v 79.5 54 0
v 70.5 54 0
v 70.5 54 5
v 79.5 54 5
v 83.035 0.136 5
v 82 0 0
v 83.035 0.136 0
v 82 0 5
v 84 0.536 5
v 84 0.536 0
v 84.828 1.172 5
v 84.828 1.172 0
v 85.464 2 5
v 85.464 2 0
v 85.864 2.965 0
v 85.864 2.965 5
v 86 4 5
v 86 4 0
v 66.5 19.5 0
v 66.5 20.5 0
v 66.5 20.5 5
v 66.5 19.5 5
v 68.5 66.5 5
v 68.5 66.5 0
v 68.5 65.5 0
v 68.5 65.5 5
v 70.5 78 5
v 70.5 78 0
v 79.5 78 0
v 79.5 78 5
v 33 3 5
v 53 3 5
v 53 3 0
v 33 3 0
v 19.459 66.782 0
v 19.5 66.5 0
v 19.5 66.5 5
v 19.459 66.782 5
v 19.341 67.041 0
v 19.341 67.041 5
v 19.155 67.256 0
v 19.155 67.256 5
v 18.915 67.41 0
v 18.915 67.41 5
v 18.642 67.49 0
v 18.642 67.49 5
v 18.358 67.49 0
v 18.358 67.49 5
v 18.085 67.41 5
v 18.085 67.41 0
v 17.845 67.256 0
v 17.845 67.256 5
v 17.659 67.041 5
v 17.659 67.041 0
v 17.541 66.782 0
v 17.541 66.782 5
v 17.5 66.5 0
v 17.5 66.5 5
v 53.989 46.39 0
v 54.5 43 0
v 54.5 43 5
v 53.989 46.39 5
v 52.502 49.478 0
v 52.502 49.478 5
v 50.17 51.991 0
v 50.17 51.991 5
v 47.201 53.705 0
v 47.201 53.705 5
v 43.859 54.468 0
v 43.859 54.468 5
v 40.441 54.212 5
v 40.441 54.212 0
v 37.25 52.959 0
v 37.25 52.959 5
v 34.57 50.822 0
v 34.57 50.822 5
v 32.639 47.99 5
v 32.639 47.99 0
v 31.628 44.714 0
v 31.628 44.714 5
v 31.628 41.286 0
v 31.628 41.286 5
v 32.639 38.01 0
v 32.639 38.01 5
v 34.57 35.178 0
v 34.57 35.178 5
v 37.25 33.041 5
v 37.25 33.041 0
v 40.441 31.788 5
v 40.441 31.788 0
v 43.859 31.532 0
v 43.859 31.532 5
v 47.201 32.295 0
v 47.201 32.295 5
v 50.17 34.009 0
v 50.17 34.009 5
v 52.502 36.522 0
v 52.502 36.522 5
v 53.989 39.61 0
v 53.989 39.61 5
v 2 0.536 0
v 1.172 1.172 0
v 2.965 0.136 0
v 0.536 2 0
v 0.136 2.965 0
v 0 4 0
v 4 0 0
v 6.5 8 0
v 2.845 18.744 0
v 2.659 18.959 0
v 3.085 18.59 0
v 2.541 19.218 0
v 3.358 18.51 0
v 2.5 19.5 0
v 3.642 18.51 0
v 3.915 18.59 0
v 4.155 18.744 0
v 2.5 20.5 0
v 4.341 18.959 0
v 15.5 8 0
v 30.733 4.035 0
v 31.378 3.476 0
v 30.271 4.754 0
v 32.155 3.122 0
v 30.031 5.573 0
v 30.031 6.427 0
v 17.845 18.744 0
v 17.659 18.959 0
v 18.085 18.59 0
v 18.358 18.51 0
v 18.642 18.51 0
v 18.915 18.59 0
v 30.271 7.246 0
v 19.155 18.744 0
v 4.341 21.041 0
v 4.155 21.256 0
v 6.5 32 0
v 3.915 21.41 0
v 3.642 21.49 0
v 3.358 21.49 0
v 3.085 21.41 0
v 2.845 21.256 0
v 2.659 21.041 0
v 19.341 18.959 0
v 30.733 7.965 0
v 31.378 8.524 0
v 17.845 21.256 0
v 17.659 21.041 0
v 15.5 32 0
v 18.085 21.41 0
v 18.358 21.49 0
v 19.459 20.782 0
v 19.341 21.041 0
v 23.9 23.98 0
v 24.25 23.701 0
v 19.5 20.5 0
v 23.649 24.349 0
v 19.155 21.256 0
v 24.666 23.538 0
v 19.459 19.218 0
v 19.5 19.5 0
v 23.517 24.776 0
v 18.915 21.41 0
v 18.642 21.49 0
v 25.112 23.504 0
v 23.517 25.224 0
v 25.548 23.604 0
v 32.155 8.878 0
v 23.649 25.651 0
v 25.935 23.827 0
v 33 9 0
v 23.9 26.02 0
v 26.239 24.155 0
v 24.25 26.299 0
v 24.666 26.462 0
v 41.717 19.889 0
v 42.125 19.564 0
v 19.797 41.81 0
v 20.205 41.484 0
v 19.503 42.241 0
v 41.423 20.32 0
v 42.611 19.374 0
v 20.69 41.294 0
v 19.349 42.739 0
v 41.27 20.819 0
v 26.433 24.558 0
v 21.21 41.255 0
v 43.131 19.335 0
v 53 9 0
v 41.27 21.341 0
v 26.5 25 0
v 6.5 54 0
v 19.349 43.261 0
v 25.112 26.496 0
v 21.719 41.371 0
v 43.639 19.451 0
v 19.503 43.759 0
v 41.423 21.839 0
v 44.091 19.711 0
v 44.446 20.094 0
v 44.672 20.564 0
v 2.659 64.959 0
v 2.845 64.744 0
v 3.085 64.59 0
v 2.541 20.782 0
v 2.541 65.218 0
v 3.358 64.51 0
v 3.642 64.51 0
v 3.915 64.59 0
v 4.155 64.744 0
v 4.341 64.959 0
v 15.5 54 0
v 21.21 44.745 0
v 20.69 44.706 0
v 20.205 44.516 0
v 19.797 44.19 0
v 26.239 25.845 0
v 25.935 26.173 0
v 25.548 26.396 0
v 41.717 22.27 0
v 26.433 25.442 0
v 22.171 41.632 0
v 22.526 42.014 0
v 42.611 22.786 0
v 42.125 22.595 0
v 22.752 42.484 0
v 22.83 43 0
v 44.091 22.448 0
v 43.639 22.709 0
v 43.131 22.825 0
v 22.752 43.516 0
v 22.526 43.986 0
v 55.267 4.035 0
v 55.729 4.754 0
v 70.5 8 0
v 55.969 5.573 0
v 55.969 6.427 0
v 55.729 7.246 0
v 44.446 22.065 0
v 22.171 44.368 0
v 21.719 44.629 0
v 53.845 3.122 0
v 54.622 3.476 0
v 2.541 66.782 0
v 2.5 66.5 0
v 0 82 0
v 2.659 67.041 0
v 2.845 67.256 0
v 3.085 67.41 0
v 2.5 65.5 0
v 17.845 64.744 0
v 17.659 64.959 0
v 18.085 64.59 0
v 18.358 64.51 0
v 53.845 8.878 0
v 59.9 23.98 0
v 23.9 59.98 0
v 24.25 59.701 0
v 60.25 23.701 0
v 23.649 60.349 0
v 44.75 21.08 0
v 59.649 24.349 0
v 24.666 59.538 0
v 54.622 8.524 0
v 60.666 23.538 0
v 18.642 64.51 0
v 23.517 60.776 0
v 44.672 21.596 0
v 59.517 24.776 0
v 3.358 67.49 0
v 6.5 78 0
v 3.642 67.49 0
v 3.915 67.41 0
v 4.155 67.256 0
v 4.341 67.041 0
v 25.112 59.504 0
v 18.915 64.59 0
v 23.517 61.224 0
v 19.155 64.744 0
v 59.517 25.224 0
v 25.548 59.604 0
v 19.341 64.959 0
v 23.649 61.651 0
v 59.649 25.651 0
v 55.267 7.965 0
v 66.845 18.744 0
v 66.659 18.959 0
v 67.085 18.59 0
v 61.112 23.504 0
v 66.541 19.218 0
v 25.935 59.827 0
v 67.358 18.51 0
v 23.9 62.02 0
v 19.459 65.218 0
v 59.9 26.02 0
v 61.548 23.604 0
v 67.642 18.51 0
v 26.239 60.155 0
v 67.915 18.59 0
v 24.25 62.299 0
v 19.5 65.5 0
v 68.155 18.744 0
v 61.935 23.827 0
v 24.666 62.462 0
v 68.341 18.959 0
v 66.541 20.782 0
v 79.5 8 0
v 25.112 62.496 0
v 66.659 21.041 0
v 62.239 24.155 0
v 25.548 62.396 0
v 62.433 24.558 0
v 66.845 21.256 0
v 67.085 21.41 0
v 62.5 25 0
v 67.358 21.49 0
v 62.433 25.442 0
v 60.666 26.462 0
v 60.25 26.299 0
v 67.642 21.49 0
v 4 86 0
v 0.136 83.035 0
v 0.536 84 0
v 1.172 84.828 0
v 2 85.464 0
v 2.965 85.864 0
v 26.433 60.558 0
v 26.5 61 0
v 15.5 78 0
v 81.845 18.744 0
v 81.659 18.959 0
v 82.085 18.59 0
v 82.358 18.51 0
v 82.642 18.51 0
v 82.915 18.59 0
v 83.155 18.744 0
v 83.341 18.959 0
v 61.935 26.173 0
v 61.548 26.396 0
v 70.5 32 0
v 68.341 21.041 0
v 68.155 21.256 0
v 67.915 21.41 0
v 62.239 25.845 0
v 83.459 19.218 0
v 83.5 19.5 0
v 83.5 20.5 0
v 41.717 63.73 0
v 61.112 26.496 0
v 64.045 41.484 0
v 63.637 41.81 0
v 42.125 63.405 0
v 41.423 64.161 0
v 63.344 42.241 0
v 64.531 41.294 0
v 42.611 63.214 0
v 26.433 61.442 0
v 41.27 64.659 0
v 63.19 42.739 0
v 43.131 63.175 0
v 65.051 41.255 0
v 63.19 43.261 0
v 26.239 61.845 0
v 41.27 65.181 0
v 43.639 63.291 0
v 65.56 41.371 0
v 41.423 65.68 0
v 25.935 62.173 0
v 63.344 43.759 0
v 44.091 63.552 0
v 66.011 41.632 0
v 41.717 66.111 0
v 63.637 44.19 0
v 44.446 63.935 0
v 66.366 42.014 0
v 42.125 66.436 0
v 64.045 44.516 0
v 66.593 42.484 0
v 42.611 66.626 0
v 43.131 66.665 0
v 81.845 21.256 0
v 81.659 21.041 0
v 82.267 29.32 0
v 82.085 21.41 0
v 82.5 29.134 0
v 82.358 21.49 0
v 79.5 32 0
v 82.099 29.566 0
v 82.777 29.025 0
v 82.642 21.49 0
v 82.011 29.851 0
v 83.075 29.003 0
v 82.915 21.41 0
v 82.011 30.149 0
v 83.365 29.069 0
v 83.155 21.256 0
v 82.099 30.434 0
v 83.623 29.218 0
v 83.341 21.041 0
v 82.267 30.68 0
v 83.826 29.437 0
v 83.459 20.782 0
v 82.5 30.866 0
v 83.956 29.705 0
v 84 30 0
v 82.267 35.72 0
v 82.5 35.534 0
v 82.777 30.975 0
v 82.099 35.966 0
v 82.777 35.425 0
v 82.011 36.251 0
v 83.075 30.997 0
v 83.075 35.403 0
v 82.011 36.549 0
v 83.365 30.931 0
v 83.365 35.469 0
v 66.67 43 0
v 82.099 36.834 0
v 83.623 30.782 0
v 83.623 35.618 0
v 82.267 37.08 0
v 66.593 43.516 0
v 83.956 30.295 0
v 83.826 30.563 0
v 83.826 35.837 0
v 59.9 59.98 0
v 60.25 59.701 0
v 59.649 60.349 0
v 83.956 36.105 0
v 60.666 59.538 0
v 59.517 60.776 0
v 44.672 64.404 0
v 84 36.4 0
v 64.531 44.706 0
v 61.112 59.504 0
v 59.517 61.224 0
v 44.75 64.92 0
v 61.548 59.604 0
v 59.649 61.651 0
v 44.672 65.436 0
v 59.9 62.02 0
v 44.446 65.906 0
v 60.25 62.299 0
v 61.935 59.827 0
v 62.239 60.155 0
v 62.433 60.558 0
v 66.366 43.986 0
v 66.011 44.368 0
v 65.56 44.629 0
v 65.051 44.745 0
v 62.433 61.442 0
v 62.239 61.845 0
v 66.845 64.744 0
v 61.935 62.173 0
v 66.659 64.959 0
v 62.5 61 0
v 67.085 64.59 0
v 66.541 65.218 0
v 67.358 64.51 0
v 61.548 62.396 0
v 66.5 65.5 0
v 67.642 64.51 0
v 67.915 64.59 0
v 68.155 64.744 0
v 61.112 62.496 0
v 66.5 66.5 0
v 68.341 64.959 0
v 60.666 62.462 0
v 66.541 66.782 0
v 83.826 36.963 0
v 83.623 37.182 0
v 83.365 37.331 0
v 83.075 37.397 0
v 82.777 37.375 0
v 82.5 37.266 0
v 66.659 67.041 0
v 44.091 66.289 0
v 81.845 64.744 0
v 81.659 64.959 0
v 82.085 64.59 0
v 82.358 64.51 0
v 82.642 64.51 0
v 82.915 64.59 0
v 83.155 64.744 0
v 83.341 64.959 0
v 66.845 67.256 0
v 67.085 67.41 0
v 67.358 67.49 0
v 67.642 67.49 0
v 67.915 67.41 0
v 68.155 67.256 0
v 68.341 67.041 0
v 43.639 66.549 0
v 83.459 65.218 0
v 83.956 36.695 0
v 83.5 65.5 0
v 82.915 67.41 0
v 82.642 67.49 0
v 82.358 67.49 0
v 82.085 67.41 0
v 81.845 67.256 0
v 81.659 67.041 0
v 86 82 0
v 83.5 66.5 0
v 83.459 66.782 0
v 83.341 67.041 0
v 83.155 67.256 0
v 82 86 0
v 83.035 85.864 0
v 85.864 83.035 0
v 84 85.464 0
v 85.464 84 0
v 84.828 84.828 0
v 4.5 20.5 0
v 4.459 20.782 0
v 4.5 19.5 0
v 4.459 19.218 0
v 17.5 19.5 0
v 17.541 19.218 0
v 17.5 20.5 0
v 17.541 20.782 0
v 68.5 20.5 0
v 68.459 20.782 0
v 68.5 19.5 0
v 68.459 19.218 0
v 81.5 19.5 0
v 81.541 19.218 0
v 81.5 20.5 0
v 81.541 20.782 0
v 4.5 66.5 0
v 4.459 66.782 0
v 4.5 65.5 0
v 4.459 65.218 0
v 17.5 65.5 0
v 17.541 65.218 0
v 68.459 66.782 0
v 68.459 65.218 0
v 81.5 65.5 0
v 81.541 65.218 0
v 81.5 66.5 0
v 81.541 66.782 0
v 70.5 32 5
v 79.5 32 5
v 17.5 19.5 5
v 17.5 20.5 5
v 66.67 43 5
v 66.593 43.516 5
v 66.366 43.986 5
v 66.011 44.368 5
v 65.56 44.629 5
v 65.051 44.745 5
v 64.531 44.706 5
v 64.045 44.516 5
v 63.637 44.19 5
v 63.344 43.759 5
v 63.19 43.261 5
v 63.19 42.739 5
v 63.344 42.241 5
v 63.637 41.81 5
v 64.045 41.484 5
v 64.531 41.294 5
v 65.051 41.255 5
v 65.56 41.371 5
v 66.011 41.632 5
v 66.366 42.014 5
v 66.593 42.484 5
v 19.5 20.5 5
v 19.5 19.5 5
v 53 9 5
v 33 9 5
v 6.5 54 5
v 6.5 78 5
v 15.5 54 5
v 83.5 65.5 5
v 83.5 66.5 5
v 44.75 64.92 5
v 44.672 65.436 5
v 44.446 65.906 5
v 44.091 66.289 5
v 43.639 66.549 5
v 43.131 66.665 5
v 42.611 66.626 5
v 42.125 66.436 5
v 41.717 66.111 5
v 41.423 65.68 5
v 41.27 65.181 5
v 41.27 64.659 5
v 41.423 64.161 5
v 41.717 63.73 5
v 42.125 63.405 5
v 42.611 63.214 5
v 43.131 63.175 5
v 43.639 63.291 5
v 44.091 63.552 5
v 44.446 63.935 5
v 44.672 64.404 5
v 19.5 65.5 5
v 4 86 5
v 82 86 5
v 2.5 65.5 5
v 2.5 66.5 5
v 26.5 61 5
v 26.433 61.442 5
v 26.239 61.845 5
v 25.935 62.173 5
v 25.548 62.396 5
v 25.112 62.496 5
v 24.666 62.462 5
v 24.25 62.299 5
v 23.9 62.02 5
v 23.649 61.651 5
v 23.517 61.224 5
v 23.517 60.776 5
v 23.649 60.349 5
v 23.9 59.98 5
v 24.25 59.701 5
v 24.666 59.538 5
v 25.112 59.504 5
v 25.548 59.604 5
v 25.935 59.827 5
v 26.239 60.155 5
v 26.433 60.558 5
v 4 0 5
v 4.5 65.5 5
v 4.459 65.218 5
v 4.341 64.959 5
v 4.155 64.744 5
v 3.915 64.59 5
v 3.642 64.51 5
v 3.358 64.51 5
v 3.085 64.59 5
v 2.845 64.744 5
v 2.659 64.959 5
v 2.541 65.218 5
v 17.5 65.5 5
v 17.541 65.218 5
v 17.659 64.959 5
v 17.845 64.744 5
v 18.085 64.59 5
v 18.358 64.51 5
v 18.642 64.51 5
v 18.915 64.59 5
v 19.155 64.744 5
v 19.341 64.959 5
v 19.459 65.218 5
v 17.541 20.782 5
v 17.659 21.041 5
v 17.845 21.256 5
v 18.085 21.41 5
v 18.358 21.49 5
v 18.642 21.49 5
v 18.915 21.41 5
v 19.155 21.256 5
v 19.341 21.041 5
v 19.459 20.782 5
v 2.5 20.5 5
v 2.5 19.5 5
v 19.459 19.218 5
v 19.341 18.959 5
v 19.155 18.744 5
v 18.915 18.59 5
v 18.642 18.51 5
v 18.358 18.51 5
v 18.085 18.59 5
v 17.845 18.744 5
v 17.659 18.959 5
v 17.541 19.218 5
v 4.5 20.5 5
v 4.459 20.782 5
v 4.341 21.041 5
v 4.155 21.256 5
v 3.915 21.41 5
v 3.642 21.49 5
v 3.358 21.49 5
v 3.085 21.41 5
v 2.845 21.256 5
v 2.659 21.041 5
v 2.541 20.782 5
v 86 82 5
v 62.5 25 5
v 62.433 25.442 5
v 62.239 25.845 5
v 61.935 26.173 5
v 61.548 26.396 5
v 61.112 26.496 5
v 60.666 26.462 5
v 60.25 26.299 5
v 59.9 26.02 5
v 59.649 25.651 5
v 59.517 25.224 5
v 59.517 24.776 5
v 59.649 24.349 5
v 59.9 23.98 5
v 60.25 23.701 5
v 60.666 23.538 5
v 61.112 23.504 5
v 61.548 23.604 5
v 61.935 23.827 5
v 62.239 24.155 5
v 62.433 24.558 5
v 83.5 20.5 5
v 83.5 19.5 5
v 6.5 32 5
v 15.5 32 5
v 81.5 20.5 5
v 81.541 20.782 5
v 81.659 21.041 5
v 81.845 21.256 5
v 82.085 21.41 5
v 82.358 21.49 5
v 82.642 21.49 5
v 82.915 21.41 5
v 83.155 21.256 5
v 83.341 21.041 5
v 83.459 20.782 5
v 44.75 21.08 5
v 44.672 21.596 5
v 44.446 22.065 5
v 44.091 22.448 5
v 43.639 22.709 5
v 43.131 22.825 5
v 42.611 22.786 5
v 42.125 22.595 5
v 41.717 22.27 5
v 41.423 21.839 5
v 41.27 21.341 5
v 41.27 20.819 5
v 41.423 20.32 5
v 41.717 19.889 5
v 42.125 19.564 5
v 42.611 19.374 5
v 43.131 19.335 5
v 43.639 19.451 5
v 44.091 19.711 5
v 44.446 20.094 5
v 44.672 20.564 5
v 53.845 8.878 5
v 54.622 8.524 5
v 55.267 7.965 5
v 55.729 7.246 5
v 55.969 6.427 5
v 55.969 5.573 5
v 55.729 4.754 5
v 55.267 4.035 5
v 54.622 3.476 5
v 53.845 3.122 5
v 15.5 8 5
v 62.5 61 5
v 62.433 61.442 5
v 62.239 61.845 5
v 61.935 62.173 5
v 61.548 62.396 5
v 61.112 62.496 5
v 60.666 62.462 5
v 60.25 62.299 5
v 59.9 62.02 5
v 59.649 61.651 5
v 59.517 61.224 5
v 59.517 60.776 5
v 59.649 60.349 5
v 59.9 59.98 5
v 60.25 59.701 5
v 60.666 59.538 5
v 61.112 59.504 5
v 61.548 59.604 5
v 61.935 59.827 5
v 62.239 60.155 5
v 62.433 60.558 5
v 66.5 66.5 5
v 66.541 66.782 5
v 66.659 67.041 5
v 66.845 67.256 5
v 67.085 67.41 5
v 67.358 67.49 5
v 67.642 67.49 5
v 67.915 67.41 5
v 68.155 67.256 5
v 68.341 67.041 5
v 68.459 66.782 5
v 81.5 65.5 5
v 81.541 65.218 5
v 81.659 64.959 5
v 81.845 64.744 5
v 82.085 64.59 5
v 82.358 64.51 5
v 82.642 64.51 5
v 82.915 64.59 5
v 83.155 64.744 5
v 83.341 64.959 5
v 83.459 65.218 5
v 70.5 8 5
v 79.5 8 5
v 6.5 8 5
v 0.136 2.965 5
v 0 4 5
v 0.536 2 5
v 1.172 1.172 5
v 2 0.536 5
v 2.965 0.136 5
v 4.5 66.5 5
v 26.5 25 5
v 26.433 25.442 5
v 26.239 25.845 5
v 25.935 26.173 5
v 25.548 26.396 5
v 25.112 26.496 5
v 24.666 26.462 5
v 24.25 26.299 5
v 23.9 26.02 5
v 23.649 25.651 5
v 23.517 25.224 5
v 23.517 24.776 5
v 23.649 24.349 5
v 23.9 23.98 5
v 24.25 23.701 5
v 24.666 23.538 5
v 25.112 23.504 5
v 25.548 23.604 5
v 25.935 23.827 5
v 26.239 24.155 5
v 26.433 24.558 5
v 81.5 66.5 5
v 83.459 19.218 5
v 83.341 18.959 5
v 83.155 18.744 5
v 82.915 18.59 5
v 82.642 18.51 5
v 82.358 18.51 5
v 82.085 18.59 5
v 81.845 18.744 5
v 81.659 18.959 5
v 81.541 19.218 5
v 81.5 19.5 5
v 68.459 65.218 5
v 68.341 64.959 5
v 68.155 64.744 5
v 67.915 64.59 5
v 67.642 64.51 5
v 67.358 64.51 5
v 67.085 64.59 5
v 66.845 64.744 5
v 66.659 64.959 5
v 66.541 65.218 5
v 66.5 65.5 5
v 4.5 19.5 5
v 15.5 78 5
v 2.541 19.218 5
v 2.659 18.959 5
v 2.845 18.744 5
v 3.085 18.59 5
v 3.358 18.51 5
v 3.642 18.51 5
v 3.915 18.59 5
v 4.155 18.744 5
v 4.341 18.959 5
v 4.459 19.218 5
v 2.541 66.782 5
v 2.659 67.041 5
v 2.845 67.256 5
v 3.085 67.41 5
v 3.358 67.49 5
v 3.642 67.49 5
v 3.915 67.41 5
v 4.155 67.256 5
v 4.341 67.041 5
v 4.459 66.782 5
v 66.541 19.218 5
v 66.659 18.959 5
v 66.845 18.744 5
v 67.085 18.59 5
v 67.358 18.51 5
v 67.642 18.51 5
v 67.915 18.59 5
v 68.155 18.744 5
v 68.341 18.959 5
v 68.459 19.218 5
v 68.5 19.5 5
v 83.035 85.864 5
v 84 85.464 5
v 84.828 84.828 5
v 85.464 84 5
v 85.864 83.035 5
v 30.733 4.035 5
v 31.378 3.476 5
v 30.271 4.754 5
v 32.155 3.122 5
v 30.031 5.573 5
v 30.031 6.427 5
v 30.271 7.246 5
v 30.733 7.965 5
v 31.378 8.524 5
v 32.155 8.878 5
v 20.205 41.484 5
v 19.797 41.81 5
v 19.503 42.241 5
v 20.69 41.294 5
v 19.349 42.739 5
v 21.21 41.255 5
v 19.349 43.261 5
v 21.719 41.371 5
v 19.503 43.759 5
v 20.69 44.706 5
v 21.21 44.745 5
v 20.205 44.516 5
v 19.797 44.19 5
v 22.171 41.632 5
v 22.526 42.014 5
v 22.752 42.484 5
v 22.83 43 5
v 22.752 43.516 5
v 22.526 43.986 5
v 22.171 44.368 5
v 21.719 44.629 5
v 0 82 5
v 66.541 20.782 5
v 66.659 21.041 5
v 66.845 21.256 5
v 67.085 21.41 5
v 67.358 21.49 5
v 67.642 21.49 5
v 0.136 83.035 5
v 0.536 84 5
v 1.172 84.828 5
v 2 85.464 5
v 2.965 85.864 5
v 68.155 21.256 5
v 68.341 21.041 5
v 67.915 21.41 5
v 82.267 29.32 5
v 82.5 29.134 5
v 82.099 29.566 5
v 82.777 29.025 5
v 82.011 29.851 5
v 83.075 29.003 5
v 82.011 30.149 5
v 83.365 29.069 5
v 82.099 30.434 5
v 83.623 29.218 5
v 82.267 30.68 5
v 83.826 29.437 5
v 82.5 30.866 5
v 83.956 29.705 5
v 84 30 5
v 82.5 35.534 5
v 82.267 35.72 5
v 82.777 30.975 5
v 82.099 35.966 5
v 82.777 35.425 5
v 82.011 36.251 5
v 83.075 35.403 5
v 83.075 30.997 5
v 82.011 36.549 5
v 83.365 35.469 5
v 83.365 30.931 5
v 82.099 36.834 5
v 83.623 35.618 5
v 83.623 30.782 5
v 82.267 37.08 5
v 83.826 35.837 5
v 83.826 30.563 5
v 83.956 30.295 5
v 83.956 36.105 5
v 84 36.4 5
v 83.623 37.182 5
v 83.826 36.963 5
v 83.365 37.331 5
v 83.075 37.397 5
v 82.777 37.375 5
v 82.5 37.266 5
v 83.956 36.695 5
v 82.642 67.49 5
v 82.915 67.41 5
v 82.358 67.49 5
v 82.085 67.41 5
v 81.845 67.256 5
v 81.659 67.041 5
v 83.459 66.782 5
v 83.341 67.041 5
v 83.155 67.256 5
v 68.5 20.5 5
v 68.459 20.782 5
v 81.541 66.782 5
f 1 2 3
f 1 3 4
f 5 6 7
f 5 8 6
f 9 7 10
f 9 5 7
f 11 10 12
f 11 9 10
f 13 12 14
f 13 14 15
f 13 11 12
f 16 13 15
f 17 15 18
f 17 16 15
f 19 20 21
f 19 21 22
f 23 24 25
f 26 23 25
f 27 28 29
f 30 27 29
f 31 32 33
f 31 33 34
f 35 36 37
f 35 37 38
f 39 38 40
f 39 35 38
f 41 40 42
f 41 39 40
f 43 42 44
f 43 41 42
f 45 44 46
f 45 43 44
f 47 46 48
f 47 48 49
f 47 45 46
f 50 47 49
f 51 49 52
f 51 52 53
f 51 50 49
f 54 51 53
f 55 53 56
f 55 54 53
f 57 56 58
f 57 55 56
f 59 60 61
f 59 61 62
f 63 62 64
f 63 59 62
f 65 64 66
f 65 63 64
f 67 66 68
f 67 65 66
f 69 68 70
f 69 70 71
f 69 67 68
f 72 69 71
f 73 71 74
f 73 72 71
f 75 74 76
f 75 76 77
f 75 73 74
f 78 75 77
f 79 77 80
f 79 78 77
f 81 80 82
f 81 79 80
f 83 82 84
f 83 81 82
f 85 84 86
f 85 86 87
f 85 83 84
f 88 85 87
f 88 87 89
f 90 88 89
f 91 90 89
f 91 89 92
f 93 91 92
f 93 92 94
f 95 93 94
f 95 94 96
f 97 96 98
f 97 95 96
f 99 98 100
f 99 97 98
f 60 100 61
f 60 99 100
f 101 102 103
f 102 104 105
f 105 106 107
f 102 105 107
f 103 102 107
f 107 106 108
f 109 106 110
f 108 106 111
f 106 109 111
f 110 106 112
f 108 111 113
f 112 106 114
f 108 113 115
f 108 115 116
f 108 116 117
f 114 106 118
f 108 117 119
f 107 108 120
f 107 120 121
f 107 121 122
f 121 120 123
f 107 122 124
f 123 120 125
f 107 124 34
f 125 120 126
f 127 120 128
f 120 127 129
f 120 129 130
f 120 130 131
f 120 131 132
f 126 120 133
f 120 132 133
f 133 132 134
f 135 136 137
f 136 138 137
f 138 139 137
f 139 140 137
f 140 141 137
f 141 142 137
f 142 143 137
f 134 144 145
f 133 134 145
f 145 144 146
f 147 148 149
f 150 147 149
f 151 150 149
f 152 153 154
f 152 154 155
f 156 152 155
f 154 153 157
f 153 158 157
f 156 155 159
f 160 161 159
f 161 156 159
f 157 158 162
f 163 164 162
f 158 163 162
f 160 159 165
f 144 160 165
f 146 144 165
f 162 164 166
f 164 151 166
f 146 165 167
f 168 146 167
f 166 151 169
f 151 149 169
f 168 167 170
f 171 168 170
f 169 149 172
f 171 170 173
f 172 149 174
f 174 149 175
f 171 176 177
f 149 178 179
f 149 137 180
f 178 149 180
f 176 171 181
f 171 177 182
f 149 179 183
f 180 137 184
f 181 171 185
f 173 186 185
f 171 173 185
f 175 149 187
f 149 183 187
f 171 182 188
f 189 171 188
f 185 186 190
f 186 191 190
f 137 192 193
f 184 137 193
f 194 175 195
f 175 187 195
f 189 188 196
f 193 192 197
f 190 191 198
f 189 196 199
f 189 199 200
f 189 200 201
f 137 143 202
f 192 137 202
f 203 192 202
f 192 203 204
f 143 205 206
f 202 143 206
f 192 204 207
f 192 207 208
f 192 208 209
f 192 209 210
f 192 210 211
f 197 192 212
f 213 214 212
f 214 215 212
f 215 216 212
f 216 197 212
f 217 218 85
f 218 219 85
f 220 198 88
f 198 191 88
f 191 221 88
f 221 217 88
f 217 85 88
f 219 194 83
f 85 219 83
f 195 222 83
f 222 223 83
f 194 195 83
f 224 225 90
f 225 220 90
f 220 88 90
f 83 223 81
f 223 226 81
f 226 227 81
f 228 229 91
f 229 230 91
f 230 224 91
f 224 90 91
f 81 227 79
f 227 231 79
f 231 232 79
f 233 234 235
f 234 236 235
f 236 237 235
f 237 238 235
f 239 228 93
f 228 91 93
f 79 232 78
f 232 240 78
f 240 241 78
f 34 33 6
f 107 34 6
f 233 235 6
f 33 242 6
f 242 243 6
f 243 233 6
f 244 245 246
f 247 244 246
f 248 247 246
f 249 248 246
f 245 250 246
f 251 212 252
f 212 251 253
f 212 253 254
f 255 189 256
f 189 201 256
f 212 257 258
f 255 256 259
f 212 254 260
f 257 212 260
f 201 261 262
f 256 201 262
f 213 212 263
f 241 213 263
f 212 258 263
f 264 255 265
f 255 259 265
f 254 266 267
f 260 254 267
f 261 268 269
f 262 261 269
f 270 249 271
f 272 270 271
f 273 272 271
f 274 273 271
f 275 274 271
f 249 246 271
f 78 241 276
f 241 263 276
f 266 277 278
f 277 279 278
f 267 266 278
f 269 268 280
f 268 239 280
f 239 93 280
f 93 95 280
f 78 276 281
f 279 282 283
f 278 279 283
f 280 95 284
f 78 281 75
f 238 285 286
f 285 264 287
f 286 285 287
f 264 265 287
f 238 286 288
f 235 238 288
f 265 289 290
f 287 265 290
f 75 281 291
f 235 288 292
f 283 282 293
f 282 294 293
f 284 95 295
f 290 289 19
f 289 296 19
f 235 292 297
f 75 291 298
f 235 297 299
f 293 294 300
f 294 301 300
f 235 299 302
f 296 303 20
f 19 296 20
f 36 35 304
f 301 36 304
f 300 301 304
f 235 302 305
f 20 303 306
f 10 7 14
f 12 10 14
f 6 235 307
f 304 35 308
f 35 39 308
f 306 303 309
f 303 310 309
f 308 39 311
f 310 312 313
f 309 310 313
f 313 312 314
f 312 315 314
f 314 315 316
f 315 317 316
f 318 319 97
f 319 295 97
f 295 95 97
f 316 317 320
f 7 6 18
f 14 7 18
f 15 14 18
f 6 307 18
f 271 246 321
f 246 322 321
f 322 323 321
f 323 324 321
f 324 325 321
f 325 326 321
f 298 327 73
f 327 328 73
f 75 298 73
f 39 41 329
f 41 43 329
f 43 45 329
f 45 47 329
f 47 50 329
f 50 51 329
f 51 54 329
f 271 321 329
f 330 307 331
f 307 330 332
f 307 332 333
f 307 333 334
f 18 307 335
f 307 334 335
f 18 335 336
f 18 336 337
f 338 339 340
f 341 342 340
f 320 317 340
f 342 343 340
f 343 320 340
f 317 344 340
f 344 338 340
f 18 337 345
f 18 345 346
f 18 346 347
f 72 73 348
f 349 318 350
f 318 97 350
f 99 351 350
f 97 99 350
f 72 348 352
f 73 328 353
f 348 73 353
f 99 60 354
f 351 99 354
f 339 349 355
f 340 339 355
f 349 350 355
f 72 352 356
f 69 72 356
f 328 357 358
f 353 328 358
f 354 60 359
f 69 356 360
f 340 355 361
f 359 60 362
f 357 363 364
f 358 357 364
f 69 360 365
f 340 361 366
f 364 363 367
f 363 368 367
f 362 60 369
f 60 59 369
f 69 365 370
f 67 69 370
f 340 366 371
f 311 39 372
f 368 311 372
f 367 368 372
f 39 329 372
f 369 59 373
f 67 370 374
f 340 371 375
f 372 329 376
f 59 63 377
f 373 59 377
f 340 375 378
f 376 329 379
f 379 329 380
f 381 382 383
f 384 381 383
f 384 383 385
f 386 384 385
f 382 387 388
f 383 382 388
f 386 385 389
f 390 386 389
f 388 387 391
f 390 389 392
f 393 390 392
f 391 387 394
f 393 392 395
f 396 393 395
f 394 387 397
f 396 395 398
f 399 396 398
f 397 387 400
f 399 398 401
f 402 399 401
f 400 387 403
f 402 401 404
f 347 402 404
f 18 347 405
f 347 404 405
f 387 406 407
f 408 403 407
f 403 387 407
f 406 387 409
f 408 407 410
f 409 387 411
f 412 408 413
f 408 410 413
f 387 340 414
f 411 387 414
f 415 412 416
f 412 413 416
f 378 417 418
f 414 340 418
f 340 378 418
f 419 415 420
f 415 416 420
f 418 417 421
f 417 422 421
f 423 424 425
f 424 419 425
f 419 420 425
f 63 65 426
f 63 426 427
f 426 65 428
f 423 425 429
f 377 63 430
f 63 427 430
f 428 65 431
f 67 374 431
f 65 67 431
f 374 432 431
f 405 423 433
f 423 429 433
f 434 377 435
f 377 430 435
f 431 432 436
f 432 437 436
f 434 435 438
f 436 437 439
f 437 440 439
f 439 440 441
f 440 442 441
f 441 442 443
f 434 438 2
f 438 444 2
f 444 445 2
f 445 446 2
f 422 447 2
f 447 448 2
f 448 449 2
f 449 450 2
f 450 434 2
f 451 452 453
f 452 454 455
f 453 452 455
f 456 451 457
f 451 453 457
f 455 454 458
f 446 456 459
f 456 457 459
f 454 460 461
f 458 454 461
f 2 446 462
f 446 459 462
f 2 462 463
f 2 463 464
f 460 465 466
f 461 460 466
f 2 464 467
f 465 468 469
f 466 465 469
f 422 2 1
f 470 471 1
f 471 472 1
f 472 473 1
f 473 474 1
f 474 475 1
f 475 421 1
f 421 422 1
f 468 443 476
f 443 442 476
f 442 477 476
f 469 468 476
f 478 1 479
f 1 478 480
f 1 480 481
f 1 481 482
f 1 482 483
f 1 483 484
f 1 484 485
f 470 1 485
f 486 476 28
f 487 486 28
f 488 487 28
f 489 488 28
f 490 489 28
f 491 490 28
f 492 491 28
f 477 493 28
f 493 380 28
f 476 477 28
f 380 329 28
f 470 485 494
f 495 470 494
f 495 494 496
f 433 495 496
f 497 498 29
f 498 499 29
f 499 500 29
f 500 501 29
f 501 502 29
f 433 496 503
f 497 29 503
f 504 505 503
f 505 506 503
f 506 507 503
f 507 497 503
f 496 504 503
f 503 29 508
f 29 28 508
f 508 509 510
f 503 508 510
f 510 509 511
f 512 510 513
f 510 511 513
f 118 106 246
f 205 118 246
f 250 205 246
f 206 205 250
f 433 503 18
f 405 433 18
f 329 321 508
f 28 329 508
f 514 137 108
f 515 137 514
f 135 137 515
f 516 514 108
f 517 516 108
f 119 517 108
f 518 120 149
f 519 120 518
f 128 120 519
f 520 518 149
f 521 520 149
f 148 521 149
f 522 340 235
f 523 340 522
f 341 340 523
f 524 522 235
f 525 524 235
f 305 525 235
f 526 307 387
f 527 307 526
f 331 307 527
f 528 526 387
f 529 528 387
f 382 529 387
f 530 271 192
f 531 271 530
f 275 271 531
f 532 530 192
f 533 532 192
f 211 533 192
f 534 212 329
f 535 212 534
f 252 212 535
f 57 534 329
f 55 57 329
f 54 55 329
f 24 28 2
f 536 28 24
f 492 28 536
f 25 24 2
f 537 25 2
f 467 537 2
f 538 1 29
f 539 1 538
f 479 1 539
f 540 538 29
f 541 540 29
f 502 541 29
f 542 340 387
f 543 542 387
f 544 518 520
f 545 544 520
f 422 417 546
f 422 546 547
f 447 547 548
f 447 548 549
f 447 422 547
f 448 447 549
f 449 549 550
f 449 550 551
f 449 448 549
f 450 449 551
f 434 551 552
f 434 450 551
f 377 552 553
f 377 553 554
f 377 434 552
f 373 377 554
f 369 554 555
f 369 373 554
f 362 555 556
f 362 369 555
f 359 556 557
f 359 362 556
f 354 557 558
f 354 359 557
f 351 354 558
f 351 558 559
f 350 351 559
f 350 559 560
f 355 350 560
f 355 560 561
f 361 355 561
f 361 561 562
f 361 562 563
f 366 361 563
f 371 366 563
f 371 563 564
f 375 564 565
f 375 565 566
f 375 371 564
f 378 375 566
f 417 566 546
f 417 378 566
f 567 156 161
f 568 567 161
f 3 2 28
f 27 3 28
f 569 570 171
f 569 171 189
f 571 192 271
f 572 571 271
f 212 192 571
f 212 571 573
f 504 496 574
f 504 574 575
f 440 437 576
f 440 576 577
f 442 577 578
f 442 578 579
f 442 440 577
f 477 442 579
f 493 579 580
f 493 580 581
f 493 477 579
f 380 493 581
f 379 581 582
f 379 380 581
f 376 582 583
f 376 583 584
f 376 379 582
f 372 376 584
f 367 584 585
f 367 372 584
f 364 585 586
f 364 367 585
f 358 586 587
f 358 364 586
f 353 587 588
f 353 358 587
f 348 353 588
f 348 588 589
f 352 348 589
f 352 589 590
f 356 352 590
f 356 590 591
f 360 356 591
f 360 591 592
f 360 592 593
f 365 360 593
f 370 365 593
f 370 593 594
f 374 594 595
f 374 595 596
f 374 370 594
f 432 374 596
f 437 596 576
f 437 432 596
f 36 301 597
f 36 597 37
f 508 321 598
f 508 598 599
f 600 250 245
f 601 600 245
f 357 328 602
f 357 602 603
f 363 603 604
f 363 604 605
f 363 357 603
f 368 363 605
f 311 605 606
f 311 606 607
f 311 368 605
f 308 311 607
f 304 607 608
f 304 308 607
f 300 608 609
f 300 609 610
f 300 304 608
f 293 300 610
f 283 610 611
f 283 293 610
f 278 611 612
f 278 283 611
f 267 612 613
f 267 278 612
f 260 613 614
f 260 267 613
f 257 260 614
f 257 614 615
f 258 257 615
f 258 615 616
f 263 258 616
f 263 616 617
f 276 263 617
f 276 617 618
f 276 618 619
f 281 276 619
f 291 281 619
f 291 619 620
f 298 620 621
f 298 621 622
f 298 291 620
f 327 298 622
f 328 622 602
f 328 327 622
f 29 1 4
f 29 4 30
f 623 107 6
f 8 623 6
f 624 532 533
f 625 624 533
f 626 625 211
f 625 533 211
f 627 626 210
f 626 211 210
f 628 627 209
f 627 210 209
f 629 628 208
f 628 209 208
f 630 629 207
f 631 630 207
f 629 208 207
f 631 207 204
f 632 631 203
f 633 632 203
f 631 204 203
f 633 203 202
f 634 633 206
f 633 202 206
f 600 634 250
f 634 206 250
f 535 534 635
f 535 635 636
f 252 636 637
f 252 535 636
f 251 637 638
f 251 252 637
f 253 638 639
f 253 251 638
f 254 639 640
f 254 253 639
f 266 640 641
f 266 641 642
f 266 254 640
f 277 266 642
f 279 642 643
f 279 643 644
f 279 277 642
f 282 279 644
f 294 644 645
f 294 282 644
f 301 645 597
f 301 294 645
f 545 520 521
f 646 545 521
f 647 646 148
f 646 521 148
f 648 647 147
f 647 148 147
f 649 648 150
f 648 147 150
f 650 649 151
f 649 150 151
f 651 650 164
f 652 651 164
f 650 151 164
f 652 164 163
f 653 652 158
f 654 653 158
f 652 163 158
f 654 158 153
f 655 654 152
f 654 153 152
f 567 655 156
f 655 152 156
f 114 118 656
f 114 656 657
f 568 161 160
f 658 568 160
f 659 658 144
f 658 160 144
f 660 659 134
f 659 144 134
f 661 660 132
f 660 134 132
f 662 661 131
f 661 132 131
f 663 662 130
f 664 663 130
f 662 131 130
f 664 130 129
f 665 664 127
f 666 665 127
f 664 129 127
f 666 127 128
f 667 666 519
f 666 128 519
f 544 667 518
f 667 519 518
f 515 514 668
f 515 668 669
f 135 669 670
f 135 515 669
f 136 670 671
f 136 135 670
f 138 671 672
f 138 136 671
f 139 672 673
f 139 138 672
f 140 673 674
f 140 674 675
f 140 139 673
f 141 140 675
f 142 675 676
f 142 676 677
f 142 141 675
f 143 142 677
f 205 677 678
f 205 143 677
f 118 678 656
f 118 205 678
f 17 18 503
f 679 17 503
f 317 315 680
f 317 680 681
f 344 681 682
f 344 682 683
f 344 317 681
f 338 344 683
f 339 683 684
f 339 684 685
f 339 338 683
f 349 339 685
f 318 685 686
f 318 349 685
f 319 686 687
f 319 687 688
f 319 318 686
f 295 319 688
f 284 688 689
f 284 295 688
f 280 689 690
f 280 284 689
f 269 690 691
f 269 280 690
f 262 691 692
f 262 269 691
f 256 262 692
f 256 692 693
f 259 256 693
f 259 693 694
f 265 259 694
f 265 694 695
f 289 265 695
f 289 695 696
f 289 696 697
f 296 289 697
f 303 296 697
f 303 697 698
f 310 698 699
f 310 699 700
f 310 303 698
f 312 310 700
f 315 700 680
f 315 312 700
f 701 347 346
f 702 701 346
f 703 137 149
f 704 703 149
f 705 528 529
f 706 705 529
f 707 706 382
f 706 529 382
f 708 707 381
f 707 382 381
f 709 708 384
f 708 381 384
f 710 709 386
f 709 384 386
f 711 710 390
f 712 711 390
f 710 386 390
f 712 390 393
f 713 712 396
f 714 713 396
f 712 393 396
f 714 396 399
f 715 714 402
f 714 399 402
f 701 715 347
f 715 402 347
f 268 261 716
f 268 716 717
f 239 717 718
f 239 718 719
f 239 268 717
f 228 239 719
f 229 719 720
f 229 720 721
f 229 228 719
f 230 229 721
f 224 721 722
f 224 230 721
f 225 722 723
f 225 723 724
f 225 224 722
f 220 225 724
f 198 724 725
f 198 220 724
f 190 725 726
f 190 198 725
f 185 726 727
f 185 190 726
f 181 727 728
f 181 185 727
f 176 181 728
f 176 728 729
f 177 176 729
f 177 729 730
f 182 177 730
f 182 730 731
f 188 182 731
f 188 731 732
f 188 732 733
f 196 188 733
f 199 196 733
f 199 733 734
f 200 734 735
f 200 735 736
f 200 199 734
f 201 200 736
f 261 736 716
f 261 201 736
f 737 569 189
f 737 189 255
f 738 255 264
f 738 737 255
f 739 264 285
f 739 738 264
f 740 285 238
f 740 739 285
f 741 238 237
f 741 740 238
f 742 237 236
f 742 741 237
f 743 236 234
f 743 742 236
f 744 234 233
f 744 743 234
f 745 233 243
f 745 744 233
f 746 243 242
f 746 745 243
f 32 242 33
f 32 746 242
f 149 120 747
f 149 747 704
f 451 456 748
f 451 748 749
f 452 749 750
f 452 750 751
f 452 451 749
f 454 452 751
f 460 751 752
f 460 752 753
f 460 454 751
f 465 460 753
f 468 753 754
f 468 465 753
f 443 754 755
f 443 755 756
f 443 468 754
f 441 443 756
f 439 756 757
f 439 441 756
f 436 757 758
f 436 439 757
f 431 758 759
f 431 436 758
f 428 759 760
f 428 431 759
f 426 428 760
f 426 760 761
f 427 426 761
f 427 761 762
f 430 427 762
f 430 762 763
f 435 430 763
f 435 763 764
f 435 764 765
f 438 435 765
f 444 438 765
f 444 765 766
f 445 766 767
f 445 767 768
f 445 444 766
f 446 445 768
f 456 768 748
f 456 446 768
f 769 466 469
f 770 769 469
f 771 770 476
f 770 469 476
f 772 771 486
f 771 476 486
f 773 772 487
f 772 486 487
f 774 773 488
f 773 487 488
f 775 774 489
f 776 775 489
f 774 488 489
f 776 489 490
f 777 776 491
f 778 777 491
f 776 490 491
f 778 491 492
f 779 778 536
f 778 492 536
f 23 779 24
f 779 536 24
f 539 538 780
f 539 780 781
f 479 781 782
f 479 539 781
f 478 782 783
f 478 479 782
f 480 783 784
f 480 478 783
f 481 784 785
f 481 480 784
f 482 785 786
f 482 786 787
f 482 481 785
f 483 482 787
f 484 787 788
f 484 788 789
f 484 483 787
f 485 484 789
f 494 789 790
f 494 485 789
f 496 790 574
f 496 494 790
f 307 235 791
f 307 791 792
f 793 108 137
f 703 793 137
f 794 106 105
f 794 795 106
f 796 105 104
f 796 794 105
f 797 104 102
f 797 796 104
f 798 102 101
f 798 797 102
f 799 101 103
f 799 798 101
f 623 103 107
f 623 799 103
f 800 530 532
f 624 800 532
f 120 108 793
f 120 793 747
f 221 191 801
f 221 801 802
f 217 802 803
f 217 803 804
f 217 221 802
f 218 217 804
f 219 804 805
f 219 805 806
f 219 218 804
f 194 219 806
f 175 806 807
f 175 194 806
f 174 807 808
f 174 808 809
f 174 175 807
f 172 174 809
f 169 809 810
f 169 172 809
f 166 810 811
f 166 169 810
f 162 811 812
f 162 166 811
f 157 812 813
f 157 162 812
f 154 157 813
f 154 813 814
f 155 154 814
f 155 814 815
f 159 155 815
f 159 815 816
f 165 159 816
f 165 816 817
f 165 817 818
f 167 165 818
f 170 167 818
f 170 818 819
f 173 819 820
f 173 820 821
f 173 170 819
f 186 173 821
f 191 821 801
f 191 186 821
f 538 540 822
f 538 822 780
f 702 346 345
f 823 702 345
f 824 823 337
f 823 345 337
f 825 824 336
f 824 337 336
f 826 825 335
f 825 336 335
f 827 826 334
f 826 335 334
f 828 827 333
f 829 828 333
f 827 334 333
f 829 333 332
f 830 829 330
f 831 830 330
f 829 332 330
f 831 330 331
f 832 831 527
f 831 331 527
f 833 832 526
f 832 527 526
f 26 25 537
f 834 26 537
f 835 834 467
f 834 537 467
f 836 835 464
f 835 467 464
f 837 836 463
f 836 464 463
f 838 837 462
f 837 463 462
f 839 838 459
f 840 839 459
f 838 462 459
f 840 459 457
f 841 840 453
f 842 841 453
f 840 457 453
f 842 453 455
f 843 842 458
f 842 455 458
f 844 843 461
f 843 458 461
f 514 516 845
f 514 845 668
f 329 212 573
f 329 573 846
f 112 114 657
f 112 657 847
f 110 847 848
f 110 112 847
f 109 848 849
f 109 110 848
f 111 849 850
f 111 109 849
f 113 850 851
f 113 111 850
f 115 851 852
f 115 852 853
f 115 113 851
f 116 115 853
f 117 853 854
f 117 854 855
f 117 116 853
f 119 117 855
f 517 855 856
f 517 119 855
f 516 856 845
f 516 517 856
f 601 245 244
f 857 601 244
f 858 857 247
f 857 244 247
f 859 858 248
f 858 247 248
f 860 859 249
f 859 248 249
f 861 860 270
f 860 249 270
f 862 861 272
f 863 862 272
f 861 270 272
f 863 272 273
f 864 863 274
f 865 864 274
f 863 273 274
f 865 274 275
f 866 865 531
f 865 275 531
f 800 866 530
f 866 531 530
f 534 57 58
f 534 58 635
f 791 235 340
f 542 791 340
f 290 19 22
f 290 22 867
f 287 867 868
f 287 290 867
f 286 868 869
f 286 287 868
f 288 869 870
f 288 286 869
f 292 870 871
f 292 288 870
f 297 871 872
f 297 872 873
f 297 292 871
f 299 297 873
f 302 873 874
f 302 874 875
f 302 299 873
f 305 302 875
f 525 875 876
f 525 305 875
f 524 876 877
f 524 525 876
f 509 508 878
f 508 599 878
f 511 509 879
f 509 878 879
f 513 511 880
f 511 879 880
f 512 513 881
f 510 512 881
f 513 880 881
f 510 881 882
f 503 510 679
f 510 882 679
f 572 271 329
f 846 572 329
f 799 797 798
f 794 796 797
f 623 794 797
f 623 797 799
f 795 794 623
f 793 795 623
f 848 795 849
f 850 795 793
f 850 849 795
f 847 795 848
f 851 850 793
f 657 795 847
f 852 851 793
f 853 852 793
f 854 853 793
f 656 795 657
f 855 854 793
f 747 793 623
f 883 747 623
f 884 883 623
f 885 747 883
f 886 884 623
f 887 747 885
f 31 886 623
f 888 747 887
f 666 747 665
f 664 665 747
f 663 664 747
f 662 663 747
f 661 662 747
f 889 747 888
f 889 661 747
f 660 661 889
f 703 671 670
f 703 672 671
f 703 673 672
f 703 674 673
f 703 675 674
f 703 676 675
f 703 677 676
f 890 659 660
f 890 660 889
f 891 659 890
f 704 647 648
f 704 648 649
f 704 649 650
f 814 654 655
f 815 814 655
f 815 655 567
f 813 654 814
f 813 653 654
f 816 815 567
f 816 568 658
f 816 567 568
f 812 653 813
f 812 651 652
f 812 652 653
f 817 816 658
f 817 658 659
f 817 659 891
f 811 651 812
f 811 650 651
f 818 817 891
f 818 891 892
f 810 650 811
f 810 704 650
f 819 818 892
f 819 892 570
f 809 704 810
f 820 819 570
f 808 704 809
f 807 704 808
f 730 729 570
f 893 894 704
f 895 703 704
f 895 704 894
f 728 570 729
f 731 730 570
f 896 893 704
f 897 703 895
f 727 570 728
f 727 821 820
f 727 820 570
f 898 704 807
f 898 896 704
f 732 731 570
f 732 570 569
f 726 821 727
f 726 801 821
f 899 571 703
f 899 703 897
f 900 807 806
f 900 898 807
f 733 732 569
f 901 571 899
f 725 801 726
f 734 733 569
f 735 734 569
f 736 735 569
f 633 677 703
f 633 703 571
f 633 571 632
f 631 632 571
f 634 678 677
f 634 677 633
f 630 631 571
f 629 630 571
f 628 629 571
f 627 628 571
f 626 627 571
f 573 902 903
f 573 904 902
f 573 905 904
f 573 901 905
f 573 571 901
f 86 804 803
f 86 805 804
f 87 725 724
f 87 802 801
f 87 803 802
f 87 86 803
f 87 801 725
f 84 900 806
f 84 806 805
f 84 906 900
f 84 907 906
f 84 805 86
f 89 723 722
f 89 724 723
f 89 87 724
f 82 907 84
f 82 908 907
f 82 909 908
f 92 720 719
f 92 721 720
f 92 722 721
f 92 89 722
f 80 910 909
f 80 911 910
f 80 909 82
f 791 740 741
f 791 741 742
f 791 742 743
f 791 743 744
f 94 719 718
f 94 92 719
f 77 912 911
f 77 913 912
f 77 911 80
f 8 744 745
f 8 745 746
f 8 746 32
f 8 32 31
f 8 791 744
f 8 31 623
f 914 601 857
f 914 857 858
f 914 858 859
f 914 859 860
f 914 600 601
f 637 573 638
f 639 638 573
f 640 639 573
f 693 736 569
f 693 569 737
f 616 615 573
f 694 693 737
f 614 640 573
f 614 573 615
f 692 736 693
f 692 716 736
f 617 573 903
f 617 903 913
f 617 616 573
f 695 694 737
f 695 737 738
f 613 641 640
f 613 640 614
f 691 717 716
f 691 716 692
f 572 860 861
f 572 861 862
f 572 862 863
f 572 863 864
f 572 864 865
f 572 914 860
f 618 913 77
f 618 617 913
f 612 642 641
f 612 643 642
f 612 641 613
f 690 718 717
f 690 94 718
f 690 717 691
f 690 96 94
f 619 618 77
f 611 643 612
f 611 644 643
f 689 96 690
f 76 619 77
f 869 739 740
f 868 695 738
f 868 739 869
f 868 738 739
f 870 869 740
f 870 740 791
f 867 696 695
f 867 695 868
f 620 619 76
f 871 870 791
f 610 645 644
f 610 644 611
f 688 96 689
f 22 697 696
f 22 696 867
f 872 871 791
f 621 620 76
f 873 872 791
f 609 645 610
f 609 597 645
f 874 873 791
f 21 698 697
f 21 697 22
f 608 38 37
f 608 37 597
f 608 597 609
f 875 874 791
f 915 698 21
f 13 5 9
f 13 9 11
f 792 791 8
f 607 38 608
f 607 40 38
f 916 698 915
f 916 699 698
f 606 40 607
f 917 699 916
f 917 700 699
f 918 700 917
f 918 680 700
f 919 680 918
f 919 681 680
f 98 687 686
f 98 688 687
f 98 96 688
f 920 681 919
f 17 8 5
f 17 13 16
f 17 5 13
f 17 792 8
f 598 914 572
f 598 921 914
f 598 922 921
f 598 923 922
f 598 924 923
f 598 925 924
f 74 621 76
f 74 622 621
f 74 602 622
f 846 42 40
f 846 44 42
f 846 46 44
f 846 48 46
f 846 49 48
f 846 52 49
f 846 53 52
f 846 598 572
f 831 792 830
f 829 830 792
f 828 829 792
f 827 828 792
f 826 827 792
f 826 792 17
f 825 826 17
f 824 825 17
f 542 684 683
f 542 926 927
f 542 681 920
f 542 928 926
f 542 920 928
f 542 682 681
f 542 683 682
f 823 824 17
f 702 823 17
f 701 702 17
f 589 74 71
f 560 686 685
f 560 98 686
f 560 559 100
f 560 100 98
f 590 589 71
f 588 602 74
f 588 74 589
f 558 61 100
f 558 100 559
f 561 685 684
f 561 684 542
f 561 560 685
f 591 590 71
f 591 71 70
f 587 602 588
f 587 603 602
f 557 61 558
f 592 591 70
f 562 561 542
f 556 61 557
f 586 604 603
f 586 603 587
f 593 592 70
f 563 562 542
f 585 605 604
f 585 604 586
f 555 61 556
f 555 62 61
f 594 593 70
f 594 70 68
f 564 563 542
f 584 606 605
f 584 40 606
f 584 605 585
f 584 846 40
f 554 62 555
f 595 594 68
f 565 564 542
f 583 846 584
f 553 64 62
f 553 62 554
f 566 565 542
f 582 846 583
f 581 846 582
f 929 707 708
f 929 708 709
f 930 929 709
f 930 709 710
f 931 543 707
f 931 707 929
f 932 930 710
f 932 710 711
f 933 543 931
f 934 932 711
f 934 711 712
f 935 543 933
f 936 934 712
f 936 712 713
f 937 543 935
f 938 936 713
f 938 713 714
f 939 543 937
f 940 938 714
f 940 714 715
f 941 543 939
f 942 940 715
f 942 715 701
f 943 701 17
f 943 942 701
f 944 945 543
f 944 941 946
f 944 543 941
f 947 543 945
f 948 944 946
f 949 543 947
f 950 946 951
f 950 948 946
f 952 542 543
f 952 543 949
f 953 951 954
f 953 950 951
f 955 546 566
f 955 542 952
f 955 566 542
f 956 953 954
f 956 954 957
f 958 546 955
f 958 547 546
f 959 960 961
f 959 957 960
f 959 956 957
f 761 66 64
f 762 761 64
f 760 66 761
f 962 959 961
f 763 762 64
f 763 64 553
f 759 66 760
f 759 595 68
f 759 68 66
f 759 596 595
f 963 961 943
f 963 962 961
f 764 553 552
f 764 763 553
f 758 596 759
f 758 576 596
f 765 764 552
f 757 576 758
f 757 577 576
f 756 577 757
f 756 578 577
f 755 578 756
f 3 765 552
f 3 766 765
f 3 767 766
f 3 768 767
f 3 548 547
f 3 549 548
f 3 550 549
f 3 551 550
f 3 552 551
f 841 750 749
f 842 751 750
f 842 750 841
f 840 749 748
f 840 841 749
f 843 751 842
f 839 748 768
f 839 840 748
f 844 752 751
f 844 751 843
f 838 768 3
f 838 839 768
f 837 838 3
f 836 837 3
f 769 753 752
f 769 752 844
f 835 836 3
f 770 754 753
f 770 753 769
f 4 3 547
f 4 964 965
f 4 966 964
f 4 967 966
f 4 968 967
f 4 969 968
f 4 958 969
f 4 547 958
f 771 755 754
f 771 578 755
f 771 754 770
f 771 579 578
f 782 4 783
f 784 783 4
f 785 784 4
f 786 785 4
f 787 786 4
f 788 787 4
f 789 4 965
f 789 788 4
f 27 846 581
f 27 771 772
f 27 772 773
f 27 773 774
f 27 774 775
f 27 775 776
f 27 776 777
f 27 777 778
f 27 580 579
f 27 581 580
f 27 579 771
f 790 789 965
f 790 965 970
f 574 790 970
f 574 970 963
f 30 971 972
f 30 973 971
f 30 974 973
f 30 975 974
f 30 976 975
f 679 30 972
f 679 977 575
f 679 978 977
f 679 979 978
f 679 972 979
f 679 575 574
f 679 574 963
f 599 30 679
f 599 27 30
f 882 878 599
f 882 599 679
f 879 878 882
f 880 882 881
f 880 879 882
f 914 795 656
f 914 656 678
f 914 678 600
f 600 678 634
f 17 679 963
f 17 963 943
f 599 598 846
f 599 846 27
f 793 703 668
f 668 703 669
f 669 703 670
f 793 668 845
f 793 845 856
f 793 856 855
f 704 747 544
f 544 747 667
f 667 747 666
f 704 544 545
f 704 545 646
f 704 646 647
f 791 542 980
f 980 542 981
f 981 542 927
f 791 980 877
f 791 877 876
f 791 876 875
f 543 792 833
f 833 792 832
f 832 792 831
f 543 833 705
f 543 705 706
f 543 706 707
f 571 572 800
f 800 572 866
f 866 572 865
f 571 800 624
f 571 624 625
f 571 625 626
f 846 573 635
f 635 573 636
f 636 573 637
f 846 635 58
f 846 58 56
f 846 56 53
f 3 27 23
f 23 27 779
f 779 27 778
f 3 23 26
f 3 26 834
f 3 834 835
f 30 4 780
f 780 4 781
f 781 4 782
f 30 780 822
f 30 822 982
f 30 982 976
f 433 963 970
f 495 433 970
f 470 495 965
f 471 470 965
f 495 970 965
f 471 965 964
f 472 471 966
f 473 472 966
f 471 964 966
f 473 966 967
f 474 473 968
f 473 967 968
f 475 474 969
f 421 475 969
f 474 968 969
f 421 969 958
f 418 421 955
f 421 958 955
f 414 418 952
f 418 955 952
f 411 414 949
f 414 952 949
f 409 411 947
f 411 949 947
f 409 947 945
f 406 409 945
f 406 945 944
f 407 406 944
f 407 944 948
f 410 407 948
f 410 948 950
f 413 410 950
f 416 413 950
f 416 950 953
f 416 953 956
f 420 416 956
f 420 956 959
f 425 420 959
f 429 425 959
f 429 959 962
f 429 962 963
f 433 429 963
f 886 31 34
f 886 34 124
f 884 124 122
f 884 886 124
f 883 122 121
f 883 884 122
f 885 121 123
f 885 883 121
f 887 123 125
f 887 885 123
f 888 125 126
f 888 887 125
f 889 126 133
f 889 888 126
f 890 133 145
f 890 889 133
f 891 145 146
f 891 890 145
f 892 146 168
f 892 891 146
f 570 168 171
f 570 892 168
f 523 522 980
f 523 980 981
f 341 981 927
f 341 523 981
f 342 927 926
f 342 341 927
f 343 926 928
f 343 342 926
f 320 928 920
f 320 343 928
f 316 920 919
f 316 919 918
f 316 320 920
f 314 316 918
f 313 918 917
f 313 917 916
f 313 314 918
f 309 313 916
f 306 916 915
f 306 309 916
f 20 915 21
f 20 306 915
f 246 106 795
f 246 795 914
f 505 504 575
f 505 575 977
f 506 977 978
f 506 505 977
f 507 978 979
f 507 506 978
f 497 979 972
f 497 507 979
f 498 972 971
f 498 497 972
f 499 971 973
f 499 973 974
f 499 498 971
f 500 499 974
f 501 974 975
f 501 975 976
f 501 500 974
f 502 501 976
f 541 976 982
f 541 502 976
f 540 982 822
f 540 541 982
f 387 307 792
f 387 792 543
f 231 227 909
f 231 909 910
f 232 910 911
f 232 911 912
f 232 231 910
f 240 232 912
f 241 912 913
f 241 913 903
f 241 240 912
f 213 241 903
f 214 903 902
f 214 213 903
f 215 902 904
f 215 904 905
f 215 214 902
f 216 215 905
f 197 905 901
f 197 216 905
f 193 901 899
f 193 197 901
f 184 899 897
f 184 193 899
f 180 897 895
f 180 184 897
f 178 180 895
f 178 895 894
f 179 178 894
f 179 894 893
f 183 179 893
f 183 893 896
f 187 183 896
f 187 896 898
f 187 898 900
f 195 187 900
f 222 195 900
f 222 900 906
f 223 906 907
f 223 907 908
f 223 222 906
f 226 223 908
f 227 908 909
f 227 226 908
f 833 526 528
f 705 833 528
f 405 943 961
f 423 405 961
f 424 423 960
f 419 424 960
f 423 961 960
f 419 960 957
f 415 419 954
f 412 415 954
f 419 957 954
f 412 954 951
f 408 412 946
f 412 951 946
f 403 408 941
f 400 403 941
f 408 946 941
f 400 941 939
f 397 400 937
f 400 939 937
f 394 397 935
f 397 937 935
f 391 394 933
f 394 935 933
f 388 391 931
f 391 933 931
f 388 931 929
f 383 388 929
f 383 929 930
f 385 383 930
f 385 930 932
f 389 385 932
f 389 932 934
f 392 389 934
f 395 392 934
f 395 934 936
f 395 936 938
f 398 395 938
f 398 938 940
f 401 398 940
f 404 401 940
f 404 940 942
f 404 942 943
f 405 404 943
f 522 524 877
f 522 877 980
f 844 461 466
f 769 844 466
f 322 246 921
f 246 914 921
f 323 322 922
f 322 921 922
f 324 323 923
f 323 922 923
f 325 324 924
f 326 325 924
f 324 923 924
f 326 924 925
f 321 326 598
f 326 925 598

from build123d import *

# Parameters (mm, degrees)
SKETCH1_W           = 86
SKETCH1_H           = 86
SKETCH1_R           = 1.5
SKETCH1_R_2         = 11.5
SKETCH1_R_3         = 1.75
SKETCH1_W_2         = 9
SKETCH1_H_2         = 24
BOSS_EXTRUDE1_DEPTH = 5
FILLET1_R           = 4
SKETCH2_R           = 1
CUT_EXTRUDE1_DEPTH  = 122.725100123


with BuildPart() as part:
    # Sketch1 → Boss-Extrude1 (new body)
    with BuildSketch(Plane.XY):
        with Locations((43, 43)):
            Rectangle(SKETCH1_W, SKETCH1_H)
        with Locations((25, 61)):
            Circle(SKETCH1_R, mode=Mode.SUBTRACT)
        with Locations((61, 61)):
            Circle(SKETCH1_R, mode=Mode.SUBTRACT)
        with Locations((25, 25)):
            Circle(SKETCH1_R, mode=Mode.SUBTRACT)
        with Locations((61, 25)):
            Circle(SKETCH1_R, mode=Mode.SUBTRACT)
        with Locations((43, 43)):
            Circle(SKETCH1_R_2, mode=Mode.SUBTRACT)
        with Locations((43, 64.920310217)):
            Circle(SKETCH1_R_3, mode=Mode.SUBTRACT)
        with Locations((64.920310217, 43)):
            Circle(SKETCH1_R_3, mode=Mode.SUBTRACT)
        with Locations((43, 21.079689783)):
            Circle(SKETCH1_R_3, mode=Mode.SUBTRACT)
        with Locations((21.079689783, 43)):
            Circle(SKETCH1_R_3, mode=Mode.SUBTRACT)
        with Locations((75, 66)):
            Rectangle(SKETCH1_W_2, SKETCH1_H_2, mode=Mode.SUBTRACT)
        with BuildLine():
            Line((68.5, 66.5), (68.5, 65.5))
            ThreePointArc((68.5, 65.5), (67.5, 64.5), (66.5, 65.5))
            Line((66.5, 65.5), (66.5, 66.5))
            ThreePointArc((66.5, 66.5), (67.5, 67.5), (68.5, 66.5))
        make_face(mode=Mode.SUBTRACT)
        with BuildLine():
            Line((81.5, 66.5), (81.5, 65.5))
            ThreePointArc((81.5, 65.5), (82.5, 64.5), (83.5, 65.5))
            Line((83.5, 65.5), (83.5, 66.5))
            ThreePointArc((83.5, 66.5), (82.5, 67.5), (81.5, 66.5))
        make_face(mode=Mode.SUBTRACT)
        with BuildLine():
            Line((68.5, 19.5), (68.5, 20.5))
            ThreePointArc((68.5, 20.5), (67.5, 21.5), (66.5, 20.5))
            Line((66.5, 20.5), (66.5, 19.5))
            ThreePointArc((66.5, 19.5), (67.5, 18.5), (68.5, 19.5))
        make_face(mode=Mode.SUBTRACT)
        with BuildLine():
            Line((81.5, 19.5), (81.5, 20.5))
            ThreePointArc((81.5, 20.5), (82.5, 21.5), (83.5, 20.5))
            Line((83.5, 20.5), (83.5, 19.5))
            ThreePointArc((83.5, 19.5), (82.5, 18.5), (81.5, 19.5))
        make_face(mode=Mode.SUBTRACT)
        with Locations((75, 20)):
            Rectangle(SKETCH1_W_2, SKETCH1_H_2, mode=Mode.SUBTRACT)
        with BuildLine():
            Line((17.5, 66.5), (17.5, 65.5))
            ThreePointArc((17.5, 65.5), (18.5, 64.5), (19.5, 65.5))
            Line((19.5, 65.5), (19.5, 66.5))
            ThreePointArc((19.5, 66.5), (18.5, 67.5), (17.5, 66.5))
        make_face(mode=Mode.SUBTRACT)
        with BuildLine():
            Line((4.5, 66.5), (4.5, 65.5))
            ThreePointArc((4.5, 65.5), (3.5, 64.5), (2.5, 65.5))
            Line((2.5, 65.5), (2.5, 66.5))
            ThreePointArc((2.5, 66.5), (3.5, 67.5), (4.5, 66.5))
        make_face(mode=Mode.SUBTRACT)
        with BuildLine():
            Line((17.5, 19.5), (17.5, 20.5))
            ThreePointArc((17.5, 20.5), (18.5, 21.5), (19.5, 20.5))
            Line((19.5, 20.5), (19.5, 19.5))
            ThreePointArc((19.5, 19.5), (18.5, 18.5), (17.5, 19.5))
        make_face(mode=Mode.SUBTRACT)
        with BuildLine():
            Line((4.5, 19.5), (4.5, 20.5))
            ThreePointArc((4.5, 20.5), (3.5, 21.5), (2.5, 20.5))
            Line((2.5, 20.5), (2.5, 19.5))
            ThreePointArc((2.5, 19.5), (3.5, 18.5), (4.5, 19.5))
        make_face(mode=Mode.SUBTRACT)
        with Locations((11, 20)):
            Rectangle(SKETCH1_W_2, SKETCH1_H_2, mode=Mode.SUBTRACT)
        with Locations((11, 66)):
            Rectangle(SKETCH1_W_2, SKETCH1_H_2, mode=Mode.SUBTRACT)
    extrude(amount=BOSS_EXTRUDE1_DEPTH)

    # Fillet1
    fillet1_edges = [part.edges().sort_by_distance(p)[0] for p in [
        (0, 86, 2.5),
        (86, 86, 2.5),
        (86, 0, 2.5),
        (0, 0, 2.5),
    ]]
    fillet(fillet1_edges, radius=FILLET1_R)

    # Sketch2 → Cut-Extrude1 (cut, through all)
    with BuildSketch(Plane.XY.offset(5)):
        with Locations((83, 36.4)):
            Circle(SKETCH2_R)
        with Locations((83, 30)):
            Circle(SKETCH2_R)
        with BuildLine():
            Line((33, 9), (53, 9))
            ThreePointArc((53, 9), (56, 6), (53, 3))
            Line((53, 3), (33, 3))
            ThreePointArc((33, 3), (30, 6), (33, 9))
        make_face()
    extrude(amount=-CUT_EXTRUDE1_DEPTH, mode=Mode.SUBTRACT)


solid = part.part
